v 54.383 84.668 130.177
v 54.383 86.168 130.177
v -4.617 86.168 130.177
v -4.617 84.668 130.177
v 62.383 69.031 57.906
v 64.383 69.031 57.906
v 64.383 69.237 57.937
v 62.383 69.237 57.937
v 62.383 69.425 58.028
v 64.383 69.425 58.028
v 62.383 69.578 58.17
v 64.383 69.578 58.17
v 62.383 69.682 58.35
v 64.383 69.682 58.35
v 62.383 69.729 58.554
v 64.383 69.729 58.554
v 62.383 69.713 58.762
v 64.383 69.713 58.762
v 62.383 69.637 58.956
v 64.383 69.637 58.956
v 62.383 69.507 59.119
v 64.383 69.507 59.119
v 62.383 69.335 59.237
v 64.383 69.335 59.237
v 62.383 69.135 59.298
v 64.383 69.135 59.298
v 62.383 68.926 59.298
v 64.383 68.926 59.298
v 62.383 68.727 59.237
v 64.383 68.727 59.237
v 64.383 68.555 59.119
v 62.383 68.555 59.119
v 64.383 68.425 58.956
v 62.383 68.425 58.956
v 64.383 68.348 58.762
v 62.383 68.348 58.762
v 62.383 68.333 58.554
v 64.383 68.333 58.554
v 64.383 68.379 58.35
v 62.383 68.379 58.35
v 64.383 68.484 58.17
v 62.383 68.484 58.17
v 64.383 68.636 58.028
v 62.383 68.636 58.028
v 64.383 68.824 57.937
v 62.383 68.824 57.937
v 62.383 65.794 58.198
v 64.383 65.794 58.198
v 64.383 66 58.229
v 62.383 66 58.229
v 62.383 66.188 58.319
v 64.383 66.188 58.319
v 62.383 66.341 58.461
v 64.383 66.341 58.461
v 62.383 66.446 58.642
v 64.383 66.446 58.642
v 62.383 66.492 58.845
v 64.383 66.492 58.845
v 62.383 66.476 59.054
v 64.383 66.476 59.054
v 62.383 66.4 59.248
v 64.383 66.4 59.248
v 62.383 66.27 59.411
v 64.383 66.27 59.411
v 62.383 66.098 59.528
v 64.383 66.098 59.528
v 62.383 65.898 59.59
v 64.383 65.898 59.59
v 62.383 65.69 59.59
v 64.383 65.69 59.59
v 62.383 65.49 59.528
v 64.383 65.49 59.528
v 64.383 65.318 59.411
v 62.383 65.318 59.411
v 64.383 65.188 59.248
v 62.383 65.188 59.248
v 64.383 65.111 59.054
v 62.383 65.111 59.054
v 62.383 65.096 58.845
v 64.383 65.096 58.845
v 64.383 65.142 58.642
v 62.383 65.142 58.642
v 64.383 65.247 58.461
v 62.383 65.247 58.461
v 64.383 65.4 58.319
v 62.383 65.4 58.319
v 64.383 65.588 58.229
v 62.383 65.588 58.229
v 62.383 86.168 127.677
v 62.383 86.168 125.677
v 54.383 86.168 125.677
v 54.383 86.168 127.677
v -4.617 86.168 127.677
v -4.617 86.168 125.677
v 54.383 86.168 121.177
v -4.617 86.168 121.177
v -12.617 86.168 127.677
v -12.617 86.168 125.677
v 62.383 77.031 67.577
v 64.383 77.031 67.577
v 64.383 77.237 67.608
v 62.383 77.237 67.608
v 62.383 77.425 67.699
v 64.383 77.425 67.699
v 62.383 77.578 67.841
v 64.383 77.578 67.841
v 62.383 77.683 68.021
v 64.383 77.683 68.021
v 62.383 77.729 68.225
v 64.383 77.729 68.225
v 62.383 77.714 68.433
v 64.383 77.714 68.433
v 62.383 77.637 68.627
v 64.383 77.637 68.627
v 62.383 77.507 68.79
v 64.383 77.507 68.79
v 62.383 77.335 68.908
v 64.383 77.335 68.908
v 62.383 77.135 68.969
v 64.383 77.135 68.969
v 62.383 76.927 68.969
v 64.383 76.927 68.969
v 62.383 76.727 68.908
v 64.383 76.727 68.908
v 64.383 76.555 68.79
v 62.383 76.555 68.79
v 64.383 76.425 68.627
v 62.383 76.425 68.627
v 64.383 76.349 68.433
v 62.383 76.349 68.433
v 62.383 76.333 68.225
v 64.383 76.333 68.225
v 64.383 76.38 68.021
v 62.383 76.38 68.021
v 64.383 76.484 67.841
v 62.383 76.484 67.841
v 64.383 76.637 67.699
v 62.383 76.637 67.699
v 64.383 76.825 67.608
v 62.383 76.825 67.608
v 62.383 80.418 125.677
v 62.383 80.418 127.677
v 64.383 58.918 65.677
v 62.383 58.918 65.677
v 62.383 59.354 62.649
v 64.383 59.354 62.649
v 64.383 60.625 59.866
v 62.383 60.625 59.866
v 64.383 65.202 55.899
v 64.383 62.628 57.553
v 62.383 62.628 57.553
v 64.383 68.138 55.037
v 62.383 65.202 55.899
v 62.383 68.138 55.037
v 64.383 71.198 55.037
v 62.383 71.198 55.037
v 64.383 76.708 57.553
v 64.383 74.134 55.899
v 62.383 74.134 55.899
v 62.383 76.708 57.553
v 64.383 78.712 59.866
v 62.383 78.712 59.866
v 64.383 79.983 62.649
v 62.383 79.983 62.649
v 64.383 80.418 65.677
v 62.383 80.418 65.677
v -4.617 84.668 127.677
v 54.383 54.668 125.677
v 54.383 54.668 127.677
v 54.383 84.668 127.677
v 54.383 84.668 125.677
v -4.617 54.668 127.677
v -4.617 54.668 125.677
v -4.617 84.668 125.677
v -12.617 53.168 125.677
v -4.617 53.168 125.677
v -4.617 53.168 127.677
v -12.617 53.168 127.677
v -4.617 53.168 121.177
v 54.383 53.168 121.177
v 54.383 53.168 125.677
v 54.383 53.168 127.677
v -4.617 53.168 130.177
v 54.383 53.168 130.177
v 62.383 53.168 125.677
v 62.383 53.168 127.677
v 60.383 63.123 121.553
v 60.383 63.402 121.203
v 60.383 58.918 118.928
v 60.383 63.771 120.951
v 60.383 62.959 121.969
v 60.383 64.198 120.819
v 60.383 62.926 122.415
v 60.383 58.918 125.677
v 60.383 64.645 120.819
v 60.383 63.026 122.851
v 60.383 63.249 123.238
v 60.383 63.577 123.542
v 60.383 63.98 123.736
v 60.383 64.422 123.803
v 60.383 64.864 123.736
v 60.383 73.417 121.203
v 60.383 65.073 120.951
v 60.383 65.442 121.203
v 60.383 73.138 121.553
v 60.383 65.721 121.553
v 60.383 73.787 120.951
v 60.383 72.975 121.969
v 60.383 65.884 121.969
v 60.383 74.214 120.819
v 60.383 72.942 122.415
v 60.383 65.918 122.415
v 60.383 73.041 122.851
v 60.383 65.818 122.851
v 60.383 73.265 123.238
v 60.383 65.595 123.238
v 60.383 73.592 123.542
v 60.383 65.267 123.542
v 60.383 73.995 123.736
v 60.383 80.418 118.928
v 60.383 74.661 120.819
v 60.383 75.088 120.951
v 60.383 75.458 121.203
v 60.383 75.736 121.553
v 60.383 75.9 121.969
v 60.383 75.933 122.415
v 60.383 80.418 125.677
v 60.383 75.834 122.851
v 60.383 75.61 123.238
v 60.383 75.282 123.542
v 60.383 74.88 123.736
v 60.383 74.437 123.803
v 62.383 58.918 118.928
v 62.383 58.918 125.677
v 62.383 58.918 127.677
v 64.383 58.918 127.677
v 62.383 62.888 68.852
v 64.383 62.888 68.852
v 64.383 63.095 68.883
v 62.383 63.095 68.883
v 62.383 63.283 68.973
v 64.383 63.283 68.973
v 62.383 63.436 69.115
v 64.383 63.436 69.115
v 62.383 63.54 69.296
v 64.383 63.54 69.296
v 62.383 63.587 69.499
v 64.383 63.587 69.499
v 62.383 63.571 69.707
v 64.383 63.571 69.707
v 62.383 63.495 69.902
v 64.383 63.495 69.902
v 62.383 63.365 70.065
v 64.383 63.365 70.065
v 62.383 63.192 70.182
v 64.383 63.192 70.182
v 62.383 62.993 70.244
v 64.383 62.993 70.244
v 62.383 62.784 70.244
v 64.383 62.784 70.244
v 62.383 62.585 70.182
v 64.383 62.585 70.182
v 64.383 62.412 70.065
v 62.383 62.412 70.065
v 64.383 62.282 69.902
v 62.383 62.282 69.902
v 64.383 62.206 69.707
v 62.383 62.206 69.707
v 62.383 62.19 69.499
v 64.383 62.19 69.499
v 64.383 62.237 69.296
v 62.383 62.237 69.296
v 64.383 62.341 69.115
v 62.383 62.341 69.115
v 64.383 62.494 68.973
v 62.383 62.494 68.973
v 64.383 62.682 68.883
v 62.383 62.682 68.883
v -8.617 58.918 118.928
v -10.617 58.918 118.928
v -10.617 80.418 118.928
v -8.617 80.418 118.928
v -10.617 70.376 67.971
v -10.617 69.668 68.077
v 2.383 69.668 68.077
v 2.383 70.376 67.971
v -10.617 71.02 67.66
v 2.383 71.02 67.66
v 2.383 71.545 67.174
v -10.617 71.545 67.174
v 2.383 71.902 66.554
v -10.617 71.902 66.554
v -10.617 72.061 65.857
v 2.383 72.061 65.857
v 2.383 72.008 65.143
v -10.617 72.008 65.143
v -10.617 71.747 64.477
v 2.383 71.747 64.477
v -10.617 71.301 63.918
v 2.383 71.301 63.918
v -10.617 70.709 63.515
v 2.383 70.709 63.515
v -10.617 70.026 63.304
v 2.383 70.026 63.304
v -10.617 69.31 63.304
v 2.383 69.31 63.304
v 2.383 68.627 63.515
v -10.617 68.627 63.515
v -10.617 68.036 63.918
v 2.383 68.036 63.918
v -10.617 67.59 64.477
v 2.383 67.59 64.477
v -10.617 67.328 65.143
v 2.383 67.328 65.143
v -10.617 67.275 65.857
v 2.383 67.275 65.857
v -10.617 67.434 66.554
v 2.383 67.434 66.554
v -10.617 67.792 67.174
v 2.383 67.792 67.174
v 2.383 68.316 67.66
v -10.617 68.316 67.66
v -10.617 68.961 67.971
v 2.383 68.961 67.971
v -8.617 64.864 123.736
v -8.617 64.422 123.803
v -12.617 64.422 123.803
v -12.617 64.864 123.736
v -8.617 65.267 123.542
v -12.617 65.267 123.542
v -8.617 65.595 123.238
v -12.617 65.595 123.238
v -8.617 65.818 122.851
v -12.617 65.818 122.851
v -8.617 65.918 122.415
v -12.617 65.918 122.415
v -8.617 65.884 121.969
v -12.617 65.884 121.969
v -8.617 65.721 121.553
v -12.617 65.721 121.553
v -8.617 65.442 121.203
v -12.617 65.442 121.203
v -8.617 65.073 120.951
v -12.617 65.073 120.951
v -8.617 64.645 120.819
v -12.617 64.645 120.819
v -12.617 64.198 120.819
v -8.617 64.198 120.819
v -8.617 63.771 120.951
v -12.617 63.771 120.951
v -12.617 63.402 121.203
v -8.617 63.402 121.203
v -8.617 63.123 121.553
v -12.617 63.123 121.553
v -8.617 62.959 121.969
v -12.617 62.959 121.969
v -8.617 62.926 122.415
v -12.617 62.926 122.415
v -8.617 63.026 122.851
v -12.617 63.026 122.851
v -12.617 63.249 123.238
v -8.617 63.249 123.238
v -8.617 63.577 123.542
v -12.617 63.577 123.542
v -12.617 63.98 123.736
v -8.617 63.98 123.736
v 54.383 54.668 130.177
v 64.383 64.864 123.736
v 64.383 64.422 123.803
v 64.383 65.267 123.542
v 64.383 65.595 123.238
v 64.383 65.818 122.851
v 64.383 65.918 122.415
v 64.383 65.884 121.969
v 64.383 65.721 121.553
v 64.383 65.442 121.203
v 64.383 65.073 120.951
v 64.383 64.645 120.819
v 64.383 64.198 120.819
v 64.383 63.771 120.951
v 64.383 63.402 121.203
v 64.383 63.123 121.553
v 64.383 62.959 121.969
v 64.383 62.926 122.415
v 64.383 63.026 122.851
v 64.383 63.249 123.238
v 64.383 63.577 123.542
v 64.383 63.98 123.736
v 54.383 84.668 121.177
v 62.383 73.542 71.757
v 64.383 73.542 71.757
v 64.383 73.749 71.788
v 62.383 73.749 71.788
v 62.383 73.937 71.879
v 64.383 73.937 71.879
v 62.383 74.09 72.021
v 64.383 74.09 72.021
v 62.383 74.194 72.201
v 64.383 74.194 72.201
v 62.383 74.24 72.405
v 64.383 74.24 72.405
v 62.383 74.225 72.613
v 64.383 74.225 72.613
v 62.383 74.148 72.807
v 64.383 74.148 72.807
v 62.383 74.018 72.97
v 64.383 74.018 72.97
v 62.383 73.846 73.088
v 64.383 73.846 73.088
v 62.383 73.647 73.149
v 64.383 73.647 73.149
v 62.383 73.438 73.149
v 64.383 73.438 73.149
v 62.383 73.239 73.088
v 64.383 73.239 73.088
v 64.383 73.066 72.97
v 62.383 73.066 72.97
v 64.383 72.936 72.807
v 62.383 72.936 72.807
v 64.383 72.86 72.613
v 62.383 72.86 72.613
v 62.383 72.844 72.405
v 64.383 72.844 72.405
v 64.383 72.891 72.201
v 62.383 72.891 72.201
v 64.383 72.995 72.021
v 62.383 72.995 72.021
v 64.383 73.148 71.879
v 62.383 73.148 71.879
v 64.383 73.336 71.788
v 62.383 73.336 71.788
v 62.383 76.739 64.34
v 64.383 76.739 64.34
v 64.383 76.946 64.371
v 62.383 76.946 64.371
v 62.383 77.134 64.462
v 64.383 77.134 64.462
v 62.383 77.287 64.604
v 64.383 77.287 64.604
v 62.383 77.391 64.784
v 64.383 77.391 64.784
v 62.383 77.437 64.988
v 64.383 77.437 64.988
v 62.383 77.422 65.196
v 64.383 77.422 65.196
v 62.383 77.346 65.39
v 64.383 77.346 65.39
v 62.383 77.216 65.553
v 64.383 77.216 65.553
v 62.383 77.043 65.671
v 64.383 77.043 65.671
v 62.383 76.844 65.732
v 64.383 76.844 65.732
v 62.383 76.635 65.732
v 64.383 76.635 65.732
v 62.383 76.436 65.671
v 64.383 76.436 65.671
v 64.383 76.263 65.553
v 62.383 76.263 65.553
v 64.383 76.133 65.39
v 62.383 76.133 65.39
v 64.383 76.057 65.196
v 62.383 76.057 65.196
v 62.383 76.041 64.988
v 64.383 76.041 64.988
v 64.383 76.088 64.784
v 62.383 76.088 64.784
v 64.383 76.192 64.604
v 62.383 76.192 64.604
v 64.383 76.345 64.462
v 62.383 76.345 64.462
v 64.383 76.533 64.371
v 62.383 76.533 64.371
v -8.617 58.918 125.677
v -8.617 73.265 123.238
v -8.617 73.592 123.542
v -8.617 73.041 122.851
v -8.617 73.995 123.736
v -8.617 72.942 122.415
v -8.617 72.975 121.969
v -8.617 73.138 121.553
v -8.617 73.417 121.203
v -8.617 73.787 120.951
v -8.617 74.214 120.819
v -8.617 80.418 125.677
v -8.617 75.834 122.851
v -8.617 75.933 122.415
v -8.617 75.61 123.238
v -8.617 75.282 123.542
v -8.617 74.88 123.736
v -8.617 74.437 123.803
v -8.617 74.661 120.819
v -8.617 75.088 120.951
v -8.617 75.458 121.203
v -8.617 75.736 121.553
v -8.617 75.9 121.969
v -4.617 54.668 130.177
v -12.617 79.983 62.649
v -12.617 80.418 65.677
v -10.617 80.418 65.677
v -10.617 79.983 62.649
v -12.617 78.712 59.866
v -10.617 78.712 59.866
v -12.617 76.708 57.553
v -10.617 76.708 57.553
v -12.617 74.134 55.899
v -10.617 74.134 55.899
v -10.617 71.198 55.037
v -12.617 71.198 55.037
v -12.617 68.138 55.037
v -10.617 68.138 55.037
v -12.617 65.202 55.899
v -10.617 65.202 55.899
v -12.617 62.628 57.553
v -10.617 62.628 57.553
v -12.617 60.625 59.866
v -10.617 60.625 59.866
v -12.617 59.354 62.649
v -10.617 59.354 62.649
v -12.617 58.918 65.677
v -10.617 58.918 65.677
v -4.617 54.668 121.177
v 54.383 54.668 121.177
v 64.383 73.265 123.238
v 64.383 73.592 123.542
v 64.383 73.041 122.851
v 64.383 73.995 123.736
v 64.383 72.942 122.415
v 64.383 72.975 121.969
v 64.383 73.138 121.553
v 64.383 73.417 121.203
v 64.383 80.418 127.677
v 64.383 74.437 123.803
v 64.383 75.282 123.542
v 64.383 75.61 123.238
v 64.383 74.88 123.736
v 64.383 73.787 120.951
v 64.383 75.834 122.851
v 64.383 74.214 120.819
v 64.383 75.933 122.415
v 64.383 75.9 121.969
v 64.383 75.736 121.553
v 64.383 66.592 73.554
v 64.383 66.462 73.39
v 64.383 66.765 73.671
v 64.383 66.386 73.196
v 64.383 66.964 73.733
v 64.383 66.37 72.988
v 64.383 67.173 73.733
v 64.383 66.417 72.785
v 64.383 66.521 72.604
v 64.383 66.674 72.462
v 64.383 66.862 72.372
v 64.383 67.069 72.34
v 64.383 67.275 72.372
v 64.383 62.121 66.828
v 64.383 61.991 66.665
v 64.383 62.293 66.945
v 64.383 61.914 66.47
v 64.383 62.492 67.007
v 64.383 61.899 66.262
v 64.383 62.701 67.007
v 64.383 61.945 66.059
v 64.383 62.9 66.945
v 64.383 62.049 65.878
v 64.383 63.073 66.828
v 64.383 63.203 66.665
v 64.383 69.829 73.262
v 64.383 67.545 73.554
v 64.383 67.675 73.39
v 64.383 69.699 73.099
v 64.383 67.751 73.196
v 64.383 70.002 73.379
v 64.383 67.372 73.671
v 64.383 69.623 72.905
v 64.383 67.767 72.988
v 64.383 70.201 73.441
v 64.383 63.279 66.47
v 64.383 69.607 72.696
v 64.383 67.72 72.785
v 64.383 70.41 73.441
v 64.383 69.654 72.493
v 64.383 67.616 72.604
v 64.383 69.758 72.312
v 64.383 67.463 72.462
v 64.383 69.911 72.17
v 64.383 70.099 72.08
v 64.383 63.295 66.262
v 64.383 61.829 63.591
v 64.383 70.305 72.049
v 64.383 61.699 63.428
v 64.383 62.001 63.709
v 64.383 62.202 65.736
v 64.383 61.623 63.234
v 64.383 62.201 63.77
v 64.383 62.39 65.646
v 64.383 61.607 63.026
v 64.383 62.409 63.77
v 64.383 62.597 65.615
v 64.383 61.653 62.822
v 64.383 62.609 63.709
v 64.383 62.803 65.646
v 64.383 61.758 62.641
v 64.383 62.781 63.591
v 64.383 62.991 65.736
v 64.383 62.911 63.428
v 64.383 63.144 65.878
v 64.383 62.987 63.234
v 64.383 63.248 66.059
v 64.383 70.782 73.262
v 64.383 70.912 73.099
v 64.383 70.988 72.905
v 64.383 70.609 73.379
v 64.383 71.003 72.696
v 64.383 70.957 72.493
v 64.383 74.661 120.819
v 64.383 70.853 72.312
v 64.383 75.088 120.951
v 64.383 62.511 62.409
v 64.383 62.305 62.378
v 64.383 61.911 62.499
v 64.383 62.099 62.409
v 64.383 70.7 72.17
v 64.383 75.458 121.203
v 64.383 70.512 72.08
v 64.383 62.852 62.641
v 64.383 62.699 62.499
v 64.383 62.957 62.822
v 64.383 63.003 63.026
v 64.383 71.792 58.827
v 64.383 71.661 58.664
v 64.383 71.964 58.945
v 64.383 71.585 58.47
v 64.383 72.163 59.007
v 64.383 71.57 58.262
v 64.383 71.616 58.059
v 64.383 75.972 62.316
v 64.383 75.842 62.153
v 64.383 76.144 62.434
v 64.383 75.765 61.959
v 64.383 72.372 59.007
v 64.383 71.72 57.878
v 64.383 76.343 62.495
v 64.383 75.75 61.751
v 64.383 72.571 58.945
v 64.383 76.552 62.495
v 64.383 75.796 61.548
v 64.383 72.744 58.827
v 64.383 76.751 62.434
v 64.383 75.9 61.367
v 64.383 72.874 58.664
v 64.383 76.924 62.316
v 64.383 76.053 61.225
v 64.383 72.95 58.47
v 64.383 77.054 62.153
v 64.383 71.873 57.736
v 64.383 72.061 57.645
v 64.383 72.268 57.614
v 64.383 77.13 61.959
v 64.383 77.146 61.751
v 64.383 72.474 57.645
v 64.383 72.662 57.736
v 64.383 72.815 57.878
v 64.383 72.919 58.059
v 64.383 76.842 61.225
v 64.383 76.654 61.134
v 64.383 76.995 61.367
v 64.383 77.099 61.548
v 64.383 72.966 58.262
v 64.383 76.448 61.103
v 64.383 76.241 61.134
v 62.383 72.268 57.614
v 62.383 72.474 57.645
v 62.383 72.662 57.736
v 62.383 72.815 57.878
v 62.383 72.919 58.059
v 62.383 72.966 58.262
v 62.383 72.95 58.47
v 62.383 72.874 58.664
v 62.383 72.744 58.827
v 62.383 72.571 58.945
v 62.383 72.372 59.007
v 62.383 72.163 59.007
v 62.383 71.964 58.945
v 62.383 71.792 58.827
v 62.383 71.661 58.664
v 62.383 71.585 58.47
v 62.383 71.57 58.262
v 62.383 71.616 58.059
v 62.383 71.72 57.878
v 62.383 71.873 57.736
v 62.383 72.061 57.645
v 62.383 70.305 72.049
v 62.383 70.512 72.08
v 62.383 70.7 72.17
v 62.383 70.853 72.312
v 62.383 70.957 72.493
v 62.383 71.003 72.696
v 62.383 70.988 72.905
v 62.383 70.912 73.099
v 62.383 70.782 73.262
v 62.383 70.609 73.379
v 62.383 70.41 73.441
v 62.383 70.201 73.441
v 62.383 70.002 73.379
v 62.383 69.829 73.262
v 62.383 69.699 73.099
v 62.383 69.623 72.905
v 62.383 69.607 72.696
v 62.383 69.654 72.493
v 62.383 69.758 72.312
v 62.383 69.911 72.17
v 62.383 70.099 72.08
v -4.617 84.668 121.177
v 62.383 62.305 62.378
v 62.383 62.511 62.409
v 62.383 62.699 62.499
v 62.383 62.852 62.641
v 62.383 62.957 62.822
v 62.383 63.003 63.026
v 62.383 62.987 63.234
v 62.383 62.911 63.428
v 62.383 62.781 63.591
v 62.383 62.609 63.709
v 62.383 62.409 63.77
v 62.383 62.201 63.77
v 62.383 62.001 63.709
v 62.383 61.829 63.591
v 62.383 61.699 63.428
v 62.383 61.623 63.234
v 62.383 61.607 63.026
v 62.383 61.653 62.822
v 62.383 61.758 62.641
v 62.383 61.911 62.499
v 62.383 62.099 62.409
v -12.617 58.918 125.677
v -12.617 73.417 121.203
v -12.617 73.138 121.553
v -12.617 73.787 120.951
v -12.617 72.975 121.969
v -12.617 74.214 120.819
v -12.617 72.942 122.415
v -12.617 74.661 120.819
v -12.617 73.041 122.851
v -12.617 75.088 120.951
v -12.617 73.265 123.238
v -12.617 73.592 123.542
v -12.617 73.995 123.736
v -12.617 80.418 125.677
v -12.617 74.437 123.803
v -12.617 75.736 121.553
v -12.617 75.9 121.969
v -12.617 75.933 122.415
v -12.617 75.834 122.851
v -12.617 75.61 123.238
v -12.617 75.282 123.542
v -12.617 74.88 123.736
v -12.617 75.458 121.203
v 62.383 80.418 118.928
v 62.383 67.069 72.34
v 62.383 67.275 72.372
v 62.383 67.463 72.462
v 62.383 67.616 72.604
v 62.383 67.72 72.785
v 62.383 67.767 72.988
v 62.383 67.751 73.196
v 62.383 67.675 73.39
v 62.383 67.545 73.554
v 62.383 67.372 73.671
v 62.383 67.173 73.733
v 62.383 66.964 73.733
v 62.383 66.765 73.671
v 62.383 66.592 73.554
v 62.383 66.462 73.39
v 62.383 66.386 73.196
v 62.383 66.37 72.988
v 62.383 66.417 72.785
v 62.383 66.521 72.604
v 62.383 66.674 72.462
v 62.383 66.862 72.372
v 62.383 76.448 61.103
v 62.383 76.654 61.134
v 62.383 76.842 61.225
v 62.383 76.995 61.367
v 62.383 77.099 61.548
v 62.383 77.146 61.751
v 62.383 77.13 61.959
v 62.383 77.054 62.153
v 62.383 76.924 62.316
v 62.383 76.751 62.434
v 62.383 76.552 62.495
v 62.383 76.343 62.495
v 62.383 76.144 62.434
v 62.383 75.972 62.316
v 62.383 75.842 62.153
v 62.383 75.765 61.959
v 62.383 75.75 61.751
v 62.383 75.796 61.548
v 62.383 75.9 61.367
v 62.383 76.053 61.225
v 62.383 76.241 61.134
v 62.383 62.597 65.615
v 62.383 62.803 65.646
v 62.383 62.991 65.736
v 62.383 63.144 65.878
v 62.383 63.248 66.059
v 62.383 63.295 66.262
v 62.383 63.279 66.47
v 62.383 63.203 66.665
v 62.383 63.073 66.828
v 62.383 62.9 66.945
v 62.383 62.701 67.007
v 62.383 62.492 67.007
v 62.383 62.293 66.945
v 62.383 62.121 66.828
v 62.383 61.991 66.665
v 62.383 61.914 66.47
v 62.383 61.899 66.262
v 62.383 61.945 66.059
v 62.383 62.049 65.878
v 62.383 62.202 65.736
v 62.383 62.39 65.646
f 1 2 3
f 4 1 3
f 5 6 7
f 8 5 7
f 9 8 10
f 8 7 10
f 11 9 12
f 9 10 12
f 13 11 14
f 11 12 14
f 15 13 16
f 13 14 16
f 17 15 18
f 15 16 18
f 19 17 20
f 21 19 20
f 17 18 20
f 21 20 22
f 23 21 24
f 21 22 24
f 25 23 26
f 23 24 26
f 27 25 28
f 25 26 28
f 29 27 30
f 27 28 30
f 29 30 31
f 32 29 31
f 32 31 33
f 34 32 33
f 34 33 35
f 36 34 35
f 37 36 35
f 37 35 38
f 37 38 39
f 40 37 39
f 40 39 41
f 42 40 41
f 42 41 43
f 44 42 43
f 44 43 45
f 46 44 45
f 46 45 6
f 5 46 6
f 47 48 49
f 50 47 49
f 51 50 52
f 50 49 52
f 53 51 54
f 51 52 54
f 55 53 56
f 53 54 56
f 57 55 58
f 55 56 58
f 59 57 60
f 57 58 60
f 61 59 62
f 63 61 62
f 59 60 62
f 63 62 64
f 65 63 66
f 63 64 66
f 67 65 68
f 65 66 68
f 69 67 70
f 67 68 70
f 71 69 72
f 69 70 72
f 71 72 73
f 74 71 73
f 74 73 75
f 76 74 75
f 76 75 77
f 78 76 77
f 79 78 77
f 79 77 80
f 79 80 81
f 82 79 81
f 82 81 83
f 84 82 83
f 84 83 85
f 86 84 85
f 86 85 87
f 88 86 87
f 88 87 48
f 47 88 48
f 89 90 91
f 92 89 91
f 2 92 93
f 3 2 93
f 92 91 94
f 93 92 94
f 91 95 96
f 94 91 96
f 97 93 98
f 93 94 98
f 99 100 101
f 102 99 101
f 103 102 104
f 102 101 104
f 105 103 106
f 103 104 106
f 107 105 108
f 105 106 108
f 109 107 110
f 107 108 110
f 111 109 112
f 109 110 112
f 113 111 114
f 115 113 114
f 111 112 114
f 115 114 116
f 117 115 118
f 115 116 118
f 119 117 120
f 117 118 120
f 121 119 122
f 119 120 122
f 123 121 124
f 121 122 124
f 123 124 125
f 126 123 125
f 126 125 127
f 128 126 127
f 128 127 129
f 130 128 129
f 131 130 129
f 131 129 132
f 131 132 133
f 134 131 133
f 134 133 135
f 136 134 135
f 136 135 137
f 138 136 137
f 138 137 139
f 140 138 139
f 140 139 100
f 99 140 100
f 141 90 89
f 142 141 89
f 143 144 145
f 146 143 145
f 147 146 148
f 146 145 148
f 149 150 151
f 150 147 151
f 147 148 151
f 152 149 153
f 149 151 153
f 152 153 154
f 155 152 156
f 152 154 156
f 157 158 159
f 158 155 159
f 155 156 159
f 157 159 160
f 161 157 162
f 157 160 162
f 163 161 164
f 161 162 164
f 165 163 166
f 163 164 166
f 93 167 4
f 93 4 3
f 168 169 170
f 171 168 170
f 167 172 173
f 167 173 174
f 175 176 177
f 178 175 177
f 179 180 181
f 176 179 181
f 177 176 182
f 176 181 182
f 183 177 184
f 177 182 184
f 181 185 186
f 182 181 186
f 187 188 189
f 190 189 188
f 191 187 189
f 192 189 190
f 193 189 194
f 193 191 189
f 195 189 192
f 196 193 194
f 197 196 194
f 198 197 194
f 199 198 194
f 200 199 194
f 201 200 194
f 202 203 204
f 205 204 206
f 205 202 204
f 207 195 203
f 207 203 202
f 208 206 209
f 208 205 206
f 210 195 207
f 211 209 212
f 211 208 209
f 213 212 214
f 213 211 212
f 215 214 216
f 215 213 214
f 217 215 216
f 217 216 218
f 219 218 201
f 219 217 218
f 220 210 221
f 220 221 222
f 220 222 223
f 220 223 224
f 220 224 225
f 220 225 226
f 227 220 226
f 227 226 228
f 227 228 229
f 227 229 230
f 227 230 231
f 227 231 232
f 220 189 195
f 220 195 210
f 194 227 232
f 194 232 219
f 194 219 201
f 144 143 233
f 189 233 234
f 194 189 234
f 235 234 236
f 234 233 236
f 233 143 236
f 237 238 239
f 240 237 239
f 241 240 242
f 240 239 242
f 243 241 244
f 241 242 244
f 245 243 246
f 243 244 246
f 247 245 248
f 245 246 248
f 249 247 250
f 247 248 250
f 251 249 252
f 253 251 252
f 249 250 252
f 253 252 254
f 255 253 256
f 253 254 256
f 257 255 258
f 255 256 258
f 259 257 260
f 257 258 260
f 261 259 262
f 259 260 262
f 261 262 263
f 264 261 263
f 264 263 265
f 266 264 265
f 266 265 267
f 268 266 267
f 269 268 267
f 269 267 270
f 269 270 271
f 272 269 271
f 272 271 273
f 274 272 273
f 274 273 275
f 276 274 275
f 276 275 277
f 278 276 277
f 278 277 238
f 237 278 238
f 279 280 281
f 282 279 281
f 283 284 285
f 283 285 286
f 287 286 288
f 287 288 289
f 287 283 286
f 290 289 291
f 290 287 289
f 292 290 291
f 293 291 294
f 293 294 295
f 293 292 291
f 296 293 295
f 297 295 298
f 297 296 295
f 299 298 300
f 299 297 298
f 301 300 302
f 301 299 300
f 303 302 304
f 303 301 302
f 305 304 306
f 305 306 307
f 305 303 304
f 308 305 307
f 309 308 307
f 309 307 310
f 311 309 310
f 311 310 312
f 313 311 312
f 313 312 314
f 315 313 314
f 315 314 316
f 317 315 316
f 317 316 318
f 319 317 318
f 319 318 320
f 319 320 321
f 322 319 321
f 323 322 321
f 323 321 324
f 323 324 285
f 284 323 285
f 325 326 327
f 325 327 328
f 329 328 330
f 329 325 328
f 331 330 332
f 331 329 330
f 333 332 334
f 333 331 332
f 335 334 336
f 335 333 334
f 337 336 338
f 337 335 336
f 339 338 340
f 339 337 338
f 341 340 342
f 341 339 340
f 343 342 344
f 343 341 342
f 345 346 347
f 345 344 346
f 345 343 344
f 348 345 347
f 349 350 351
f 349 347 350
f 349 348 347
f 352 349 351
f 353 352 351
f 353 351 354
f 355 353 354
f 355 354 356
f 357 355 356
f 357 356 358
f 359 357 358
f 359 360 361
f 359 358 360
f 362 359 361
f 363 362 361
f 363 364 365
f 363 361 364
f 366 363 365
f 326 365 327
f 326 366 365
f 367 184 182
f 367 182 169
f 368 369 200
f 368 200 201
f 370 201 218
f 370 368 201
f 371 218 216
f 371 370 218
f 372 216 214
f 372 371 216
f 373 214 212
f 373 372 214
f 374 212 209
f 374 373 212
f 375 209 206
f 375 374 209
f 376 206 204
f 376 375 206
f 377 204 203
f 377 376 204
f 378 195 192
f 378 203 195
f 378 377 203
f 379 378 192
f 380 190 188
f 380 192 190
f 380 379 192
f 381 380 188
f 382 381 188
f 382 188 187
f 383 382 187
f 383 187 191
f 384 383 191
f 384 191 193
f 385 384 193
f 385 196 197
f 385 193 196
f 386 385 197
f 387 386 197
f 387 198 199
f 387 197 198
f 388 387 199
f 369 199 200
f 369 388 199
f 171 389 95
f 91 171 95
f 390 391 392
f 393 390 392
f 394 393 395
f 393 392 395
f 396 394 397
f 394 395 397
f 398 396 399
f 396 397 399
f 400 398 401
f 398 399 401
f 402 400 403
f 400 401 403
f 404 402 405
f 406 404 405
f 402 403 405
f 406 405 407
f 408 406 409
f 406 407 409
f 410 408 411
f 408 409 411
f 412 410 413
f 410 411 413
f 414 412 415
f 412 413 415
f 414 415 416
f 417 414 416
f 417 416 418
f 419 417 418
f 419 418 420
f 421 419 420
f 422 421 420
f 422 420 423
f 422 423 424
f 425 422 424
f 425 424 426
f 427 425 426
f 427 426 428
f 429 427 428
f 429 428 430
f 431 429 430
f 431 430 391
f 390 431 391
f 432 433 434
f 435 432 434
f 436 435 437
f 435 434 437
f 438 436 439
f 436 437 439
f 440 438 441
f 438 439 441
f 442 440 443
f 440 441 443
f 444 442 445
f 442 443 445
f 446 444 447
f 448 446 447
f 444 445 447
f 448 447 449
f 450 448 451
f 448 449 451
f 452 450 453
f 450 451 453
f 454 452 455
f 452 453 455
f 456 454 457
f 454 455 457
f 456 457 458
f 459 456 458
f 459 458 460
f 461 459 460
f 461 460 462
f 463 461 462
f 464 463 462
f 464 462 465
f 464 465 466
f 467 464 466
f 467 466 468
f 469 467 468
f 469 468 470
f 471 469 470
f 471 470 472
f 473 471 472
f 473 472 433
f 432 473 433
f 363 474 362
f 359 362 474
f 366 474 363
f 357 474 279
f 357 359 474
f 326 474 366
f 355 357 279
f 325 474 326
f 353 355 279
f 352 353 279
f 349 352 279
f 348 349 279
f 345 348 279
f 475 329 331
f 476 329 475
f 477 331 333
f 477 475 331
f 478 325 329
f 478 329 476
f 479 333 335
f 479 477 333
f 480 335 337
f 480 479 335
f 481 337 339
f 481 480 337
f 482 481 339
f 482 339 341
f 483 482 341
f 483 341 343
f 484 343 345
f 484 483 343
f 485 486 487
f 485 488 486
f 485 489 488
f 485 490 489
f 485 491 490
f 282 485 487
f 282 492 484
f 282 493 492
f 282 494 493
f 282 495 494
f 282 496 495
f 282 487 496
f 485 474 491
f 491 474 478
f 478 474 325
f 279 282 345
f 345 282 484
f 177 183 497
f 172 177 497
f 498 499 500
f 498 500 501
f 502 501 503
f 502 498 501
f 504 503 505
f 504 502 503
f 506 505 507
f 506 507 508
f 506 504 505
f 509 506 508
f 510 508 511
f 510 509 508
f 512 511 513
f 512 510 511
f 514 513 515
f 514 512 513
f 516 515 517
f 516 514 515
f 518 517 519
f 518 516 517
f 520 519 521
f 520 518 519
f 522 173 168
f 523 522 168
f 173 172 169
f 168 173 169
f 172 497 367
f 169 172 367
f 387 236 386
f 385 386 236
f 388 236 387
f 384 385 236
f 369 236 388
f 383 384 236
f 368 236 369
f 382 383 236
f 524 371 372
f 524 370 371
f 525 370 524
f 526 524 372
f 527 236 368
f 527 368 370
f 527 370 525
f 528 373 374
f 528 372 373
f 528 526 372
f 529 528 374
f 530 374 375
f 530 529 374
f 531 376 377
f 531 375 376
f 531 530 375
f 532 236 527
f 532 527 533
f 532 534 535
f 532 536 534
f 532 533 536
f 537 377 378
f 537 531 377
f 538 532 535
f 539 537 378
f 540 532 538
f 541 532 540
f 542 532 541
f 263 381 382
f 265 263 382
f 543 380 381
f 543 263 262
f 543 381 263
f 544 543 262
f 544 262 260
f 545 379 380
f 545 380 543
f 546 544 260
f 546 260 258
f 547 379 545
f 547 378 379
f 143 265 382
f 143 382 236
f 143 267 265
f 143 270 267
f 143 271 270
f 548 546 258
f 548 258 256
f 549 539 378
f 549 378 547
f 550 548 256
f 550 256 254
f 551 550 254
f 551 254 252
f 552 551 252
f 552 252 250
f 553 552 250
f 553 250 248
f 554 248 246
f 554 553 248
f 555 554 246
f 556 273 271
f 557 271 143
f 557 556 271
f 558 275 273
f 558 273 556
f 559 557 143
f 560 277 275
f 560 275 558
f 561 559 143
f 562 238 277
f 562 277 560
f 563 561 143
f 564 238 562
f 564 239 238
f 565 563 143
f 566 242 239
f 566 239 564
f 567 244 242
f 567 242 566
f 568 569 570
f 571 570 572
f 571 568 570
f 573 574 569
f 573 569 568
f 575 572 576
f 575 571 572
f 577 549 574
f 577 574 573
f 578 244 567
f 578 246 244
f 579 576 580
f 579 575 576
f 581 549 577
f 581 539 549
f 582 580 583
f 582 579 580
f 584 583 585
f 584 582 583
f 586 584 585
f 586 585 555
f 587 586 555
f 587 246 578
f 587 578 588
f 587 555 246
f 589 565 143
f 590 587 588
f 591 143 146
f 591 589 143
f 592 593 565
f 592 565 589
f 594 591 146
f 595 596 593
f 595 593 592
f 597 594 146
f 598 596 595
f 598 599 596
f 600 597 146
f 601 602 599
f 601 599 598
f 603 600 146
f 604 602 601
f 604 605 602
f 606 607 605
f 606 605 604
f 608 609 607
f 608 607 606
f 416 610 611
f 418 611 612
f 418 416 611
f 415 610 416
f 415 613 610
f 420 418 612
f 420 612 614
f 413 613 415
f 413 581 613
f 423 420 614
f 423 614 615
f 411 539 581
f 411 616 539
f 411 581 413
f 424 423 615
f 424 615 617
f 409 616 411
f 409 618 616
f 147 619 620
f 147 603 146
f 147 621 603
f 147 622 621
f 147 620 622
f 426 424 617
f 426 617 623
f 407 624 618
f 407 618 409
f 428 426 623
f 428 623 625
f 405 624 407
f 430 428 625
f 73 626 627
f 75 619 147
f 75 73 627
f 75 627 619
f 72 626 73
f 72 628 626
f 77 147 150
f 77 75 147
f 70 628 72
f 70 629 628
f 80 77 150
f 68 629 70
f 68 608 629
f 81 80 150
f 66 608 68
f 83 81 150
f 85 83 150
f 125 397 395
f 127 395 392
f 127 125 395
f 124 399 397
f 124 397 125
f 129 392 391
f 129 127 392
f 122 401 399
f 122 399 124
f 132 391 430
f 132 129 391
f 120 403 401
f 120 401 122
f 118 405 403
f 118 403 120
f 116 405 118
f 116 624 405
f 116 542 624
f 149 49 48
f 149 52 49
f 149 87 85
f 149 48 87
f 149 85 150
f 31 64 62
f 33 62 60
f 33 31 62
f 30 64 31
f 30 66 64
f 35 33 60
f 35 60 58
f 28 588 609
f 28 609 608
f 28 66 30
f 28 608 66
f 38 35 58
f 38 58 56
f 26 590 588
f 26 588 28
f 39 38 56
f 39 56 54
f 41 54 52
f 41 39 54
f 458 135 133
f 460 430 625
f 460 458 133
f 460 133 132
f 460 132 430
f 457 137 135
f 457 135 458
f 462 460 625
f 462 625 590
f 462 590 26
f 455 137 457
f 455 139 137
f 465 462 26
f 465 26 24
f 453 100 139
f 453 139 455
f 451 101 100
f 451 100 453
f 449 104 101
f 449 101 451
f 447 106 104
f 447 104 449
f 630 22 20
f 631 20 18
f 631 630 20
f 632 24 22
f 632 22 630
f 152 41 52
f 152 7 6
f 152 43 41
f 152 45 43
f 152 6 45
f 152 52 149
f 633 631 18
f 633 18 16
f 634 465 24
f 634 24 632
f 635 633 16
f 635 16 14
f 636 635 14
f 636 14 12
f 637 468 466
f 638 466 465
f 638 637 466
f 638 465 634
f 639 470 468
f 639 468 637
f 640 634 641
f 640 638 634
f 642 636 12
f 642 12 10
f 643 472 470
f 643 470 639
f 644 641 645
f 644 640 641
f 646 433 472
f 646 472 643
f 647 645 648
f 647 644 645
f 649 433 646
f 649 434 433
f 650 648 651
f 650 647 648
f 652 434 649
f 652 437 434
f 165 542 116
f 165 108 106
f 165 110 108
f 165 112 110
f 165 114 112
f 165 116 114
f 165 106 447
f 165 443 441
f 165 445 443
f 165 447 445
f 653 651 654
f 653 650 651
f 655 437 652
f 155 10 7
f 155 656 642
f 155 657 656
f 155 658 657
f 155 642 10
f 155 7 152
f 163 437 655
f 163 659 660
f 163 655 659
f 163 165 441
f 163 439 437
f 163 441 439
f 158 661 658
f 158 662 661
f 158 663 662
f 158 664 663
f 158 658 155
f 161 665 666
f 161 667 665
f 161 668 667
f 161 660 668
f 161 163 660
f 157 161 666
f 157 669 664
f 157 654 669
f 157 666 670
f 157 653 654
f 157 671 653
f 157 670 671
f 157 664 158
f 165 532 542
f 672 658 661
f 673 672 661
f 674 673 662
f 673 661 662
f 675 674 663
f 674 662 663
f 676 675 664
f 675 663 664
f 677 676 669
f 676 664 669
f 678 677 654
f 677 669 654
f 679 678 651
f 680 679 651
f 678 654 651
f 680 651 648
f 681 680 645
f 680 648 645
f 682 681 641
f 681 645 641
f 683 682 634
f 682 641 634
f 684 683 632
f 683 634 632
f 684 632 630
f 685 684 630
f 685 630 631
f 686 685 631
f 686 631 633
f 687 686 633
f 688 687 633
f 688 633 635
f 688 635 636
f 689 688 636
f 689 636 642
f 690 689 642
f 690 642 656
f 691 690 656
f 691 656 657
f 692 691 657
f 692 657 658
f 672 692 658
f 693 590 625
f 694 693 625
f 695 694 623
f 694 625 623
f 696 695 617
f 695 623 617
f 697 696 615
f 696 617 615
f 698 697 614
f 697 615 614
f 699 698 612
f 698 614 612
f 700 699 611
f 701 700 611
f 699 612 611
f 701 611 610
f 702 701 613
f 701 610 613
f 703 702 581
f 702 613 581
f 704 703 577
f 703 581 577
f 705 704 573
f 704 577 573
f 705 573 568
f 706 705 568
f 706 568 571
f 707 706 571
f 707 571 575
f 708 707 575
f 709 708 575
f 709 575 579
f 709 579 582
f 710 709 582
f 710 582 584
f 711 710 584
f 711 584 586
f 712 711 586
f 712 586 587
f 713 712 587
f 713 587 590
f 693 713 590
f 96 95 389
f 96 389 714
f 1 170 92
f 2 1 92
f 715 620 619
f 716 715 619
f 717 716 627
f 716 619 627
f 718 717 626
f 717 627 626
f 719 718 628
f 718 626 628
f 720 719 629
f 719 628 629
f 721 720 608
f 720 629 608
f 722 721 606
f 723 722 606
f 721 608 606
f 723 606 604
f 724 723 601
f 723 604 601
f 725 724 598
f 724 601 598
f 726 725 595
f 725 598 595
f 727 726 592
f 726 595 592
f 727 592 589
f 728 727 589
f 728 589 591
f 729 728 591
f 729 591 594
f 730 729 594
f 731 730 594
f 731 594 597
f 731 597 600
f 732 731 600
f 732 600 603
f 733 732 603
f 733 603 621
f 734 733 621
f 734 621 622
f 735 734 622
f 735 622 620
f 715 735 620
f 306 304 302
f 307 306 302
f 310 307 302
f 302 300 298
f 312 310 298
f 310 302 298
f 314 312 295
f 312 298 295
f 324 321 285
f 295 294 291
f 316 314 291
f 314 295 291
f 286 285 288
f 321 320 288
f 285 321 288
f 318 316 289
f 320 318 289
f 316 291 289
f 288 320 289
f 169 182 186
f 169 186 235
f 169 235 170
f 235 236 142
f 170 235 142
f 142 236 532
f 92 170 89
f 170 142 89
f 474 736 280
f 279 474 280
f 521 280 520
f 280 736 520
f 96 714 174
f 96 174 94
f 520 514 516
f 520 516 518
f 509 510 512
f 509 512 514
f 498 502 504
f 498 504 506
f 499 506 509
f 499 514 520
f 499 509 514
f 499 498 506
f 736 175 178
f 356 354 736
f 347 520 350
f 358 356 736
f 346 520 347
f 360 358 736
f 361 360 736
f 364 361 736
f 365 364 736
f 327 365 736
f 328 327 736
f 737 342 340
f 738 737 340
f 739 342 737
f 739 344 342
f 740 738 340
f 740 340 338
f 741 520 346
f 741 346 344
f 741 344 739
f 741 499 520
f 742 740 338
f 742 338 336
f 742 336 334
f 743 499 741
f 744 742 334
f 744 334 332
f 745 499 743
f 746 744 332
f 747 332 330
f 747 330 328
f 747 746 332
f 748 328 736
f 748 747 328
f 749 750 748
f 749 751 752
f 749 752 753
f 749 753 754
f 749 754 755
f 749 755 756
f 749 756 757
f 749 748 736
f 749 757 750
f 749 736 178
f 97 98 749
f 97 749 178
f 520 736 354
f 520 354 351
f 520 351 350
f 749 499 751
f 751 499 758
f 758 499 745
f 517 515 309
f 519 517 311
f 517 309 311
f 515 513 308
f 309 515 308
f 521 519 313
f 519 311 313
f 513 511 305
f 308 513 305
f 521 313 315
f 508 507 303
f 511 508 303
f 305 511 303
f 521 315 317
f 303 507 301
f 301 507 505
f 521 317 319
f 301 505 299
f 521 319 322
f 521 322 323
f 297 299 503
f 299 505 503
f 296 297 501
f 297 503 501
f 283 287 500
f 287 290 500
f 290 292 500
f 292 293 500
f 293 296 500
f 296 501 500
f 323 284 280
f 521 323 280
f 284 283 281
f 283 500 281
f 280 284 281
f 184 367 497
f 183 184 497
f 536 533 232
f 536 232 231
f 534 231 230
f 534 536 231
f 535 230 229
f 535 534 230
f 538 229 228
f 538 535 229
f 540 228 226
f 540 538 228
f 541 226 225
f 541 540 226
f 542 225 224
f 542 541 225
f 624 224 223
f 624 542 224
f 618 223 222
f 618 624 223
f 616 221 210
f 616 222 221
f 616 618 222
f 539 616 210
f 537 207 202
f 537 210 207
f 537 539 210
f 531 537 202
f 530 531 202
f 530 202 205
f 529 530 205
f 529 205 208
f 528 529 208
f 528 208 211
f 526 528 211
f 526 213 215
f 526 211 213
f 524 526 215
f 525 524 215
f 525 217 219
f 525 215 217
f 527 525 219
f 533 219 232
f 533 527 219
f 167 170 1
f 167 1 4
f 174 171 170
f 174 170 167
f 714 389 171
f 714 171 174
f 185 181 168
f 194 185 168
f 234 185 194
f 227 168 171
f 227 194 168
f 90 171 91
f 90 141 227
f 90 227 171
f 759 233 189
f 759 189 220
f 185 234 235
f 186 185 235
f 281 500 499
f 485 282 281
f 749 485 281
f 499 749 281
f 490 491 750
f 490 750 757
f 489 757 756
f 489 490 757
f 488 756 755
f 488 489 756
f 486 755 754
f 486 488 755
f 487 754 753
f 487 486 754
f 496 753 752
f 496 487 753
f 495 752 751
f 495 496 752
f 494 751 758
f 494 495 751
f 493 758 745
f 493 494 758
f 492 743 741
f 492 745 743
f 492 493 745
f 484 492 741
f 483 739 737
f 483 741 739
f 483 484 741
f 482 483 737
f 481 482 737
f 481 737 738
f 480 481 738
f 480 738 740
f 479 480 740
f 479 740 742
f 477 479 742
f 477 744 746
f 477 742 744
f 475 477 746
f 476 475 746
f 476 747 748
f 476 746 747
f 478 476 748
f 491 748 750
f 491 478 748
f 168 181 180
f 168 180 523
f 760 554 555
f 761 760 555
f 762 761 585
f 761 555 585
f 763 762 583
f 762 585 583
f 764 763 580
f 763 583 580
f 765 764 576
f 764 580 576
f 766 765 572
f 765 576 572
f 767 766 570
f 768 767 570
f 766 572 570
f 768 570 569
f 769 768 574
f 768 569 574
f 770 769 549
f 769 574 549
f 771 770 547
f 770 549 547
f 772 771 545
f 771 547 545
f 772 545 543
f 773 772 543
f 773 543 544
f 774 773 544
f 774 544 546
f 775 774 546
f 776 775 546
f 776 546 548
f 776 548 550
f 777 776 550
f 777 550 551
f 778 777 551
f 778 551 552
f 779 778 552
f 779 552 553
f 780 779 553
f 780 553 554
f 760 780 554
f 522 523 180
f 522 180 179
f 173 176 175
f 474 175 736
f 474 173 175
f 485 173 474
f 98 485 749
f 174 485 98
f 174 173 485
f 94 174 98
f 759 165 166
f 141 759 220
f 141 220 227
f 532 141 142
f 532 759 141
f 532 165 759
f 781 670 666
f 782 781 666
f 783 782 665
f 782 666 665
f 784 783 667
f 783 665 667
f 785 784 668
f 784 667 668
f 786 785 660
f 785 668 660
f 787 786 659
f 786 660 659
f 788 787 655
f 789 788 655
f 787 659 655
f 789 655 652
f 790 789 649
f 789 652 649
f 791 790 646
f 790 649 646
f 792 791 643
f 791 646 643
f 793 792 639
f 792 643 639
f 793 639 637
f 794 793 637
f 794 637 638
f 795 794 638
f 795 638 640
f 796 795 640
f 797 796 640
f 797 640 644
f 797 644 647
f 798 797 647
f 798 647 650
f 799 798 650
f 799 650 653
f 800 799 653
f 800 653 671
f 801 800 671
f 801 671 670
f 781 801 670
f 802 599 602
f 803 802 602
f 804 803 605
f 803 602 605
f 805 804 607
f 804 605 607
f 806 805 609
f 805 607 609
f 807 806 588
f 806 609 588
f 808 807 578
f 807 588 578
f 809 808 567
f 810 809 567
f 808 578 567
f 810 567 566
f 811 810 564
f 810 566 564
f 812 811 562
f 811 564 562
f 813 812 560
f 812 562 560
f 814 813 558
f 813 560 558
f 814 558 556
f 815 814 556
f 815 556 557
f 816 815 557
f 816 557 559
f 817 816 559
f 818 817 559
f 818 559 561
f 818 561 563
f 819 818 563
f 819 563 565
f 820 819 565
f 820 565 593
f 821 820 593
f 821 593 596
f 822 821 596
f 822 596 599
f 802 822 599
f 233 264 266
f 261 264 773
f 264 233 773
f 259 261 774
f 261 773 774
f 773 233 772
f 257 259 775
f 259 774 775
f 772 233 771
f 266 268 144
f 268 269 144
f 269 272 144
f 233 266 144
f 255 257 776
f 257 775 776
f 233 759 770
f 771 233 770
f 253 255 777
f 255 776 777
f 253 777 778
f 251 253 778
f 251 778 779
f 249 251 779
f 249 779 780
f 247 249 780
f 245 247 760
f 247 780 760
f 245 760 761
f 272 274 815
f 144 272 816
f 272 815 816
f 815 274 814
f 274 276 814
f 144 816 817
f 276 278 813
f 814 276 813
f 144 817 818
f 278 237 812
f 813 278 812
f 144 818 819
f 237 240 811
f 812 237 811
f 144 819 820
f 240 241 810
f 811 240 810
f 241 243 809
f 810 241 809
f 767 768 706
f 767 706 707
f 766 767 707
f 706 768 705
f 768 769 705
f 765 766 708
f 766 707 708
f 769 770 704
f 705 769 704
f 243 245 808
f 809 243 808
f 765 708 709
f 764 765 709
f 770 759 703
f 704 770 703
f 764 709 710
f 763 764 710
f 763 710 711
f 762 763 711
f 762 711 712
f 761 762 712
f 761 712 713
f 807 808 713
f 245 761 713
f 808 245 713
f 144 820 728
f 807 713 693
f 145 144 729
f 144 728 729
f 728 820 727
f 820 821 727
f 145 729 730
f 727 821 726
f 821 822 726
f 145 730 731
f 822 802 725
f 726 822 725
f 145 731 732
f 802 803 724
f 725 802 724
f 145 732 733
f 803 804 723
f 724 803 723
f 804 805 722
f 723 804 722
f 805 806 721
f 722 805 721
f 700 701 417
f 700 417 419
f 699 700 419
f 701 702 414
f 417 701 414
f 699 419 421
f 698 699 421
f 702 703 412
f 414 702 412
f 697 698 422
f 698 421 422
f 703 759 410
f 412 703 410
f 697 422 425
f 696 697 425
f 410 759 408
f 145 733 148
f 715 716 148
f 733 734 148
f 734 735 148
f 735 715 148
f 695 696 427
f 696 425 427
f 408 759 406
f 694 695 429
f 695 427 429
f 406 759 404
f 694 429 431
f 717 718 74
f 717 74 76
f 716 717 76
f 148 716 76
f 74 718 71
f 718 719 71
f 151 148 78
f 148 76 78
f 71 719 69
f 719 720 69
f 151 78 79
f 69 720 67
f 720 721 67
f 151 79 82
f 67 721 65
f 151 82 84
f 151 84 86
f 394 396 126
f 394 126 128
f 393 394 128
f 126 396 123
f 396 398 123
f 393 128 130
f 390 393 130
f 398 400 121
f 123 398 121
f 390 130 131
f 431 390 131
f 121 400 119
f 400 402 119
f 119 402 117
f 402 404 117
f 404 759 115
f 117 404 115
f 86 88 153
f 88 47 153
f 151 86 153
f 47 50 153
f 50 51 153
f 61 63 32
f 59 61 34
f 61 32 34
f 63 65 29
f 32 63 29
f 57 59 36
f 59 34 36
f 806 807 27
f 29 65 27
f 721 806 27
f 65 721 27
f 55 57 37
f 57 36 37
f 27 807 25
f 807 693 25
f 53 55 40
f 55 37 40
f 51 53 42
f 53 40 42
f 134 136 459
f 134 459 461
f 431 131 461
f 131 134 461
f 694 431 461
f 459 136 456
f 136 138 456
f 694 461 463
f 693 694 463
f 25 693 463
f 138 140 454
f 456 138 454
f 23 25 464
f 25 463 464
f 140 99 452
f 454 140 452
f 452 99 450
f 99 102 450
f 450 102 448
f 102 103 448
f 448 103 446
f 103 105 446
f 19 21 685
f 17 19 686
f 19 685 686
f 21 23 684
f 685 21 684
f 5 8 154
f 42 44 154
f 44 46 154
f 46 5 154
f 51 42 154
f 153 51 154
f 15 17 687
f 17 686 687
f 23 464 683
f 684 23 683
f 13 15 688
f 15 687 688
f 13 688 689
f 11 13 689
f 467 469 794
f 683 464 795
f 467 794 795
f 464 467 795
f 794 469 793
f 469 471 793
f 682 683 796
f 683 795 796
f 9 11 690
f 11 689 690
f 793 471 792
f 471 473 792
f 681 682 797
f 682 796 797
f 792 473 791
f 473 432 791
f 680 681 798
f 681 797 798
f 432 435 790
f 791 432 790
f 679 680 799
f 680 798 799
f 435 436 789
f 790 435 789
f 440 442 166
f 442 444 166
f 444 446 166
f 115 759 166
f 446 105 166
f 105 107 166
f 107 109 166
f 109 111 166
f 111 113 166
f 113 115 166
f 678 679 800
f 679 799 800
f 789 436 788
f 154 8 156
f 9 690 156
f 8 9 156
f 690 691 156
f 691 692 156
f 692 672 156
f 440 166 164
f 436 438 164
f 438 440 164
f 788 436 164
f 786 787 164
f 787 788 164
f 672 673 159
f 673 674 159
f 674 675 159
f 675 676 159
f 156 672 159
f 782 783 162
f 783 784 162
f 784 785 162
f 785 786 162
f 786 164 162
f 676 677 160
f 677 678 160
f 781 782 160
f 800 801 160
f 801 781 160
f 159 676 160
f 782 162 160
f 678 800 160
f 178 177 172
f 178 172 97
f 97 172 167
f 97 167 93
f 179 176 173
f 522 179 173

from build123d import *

# Parameters (mm, degrees)
SKETCH_2_R               = 10.75
SKETCH_2_R_2             = 0.5
EXTRUDE_1_DEPTH          = 2
EXTRUDE_3_DEPTH          = 2
SKETCH_4_W               = 2
SKETCH_4_H               = 33
EXTRUDE_4_DEPTH          = 75
SKETCH_8_R               = 0.7
CUT_EXTRUDE_1_DEPTH      = 7
SKETCH_9_W               = 2
SKETCH_9_H               = 21.5
EXTRUDE_7_DEPTH          = 60
EXTRUDE_2_DEPTH          = 2
SKETCH_11_R              = 2.4
EXTRUDE_8_DEPTH          = 15
SKETCH_12_W              = 59
SKETCH_12_H              = 30
CUT_EXTRUDE_2_DEPTH      = 15
SKETCH_13_W              = 59
SKETCH_13_H              = 1.5
EXTRUDE_9_DEPTH          = 4.5
SKETCH_15_W              = 6.749564512
SKETCH_15_H              = 21.5
EXTRUDE_10_DEPTH         = 2
SKETCH_16_W              = 6.749564512
SKETCH_16_H              = 21.5
EXTRUDE_11_DEPTH         = 2
CUT_EXTRUDE_3_DEPTH      = 173.33717765
CUT_EXTRUDE_3_DEPTH_BACK = 173.33717765
SKETCH_17_R              = 1.5


with BuildPart() as part:
    # 스케치2 → 보스-돌출1 (new body)
    with BuildSketch(Plane(origin=(62.38287134, 0, 0), x_dir=(0, 0, -1), z_dir=(1, 0, 0))):
        with Locations((-65.677419436, 69.66810471)):
            Circle(SKETCH_2_R)
        with Locations((-61.803243354, 76.447725619)):
            Circle(SKETCH_2_R_2, mode=Mode.SUBTRACT)
        with Locations((-65.040124528, 76.73944512)):
            Circle(SKETCH_2_R_2, mode=Mode.SUBTRACT)
        with Locations((-68.277005701, 77.03116462)):
            Circle(SKETCH_2_R_2, mode=Mode.SUBTRACT)
        with Locations((-72.457040346, 73.542280792)):
            Circle(SKETCH_2_R_2, mode=Mode.SUBTRACT)
        with Locations((-72.748759847, 70.305399618)):
            Circle(SKETCH_2_R_2, mode=Mode.SUBTRACT)
        with Locations((-73.040479347, 67.068518444)):
            Circle(SKETCH_2_R_2, mode=Mode.SUBTRACT)
        with Locations((-69.551595519, 62.8884838)):
            Circle(SKETCH_2_R_2, mode=Mode.SUBTRACT)
        with Locations((-66.314714345, 62.596764299)):
            Circle(SKETCH_2_R_2, mode=Mode.SUBTRACT)
        with Locations((-63.077833171, 62.305044799)):
            Circle(SKETCH_2_R_2, mode=Mode.SUBTRACT)
        with Locations((-58.897798526, 65.793928627)):
            Circle(SKETCH_2_R_2, mode=Mode.SUBTRACT)
        with Locations((-58.606079026, 69.030809801)):
            Circle(SKETCH_2_R_2, mode=Mode.SUBTRACT)
        with Locations((-58.314359525, 72.267690975)):
            Circle(SKETCH_2_R_2, mode=Mode.SUBTRACT)
    extrude(amount=EXTRUDE_1_DEPTH)

    # 스케치3 → 보스-돌출3 (add)
    with BuildSketch(Plane.ZY.offset(-62.38287134)):
        with BuildLine():
            Line((65.677419436, 80.41810471), (127.677419436, 80.41810471))
            Line((127.677419436, 80.41810471), (127.677419436, 58.91810471))
            Line((127.677419436, 58.91810471), (65.677419436, 58.91810471))
            ThreePointArc((65.677419436, 58.91810471), (76.427419436, 69.66810471), (65.677419436, 80.41810471))
        make_face()
    extrude(amount=-EXTRUDE_3_DEPTH)

    # 스케치4 → 보스-돌출4 (add)
    with BuildSketch(Plane.ZY.offset(-62.38287134)):
        with Locations((126.677419436, 69.66810471)):
            Rectangle(SKETCH_4_W, SKETCH_4_H)
    extrude(amount=EXTRUDE_4_DEPTH)

    # 스케치8 → 컷-돌출1 (cut)
    with BuildSketch(Plane(origin=(64.38287134, 0, 0), x_dir=(0, 0, -1), z_dir=(1, 0, 0))):
        with Locations((-68.277005701, 77.03116462)):
            Circle(SKETCH_8_R)
        with Locations((-65.040124528, 76.73944512)):
            Circle(SKETCH_8_R)
        with Locations((-61.803243354, 76.447725619)):
            Circle(SKETCH_8_R)
        with Locations((-58.314359525, 72.267690975)):
            Circle(SKETCH_8_R)
        with Locations((-58.606079026, 69.030809801)):
            Circle(SKETCH_8_R)
        with Locations((-58.897798526, 65.793928627)):
            Circle(SKETCH_8_R)
        with Locations((-63.077833171, 62.305044799)):
            Circle(SKETCH_8_R)
        with Locations((-66.314714345, 62.596764299)):
            Circle(SKETCH_8_R)
        with Locations((-69.551595519, 62.8884838)):
            Circle(SKETCH_8_R)
        with Locations((-73.040479347, 67.068518444)):
            Circle(SKETCH_8_R)
        with Locations((-72.748759847, 70.305399618)):
            Circle(SKETCH_8_R)
        with Locations((-72.457040346, 73.542280792)):
            Circle(SKETCH_8_R)
    extrude(amount=-CUT_EXTRUDE_1_DEPTH, mode=Mode.SUBTRACT)

    # 스케치9 → 보스-돌출7 (add)
    with BuildSketch(Plane(origin=(0, 0, 125.677419436), x_dir=(-1, 0, 0), z_dir=(0, 0, -1))):
        with Locations((11.61712866, 69.66810471)):
            Rectangle(SKETCH_9_W, SKETCH_9_H)
    extrude(amount=EXTRUDE_7_DEPTH)

    # 스케치10 → 돌출-얇게2 (add)
    with BuildSketch(Plane.ZY.offset(12.61712866)):
        with BuildLine():
            ThreePointArc((65.677419436, 80.41810471), (54.927419436, 69.66810471), (65.677419436, 58.91810471))
            Line((65.677419436, 58.91810471), (65.677419436, 68.91810471))
            ThreePointArc((65.677419436, 68.91810471), (64.927419436, 69.66810471), (65.677419436, 70.41810471))
            Line((65.677419436, 70.41810471), (65.677419436, 80.41810471))
        make_face()
    extrude(amount=-EXTRUDE_2_DEPTH)

    # 스케치11 → 보스-돌출8 (add)
    with BuildSketch(Plane.ZY.offset(12.61712866)):
        with Locations((65.677419436, 69.66810471)):
            Circle(SKETCH_11_R)
    extrude(amount=-EXTRUDE_8_DEPTH)

    # 스케치12 → 컷-돌출2 (cut)
    with BuildSketch(Plane.XY.offset(127.677419436)):
        with Locations((24.88287134, 69.66810471)):
            Rectangle(SKETCH_12_W, SKETCH_12_H)
    extrude(amount=-CUT_EXTRUDE_2_DEPTH, mode=Mode.SUBTRACT)

    # 스케치13 → 보스-돌출9 (add, symmetric)
    with BuildSketch(Plane(origin=(0, 0, 125.677419436), x_dir=(-1, 0, 0), z_dir=(0, 0, -1))):
        with Locations((-24.88287134, 53.91810471)):
            Rectangle(SKETCH_13_W, SKETCH_13_H)
        with Locations((-24.88287134, 85.41810471)):
            Rectangle(SKETCH_13_W, SKETCH_13_H)
    extrude(amount=EXTRUDE_9_DEPTH, both=True)

    # 스케치15 → 보스-돌출10 (add)
    with BuildSketch(Plane.ZY.offset(-62.38287134)):
        with Locations((122.30263718, 69.66810471)):
            Rectangle(SKETCH_15_W, SKETCH_15_H)
    extrude(amount=EXTRUDE_10_DEPTH)

    # 스케치16 → 보스-돌출11 (add)
    with BuildSketch(Plane(origin=(-10.61712866, 0, 0), x_dir=(0, 0, -1), z_dir=(1, 0, 0))):
        with Locations((-122.30263718, 69.66810471)):
            Rectangle(SKETCH_16_W, SKETCH_16_H)
    extrude(amount=EXTRUDE_11_DEPTH)

    # 스케치17 → 컷-돌출3 (cut, two sides: drawn at the far end of the back side and taken through both)
    with BuildSketch(Plane.ZY.offset(-60.38287134).offset(-CUT_EXTRUDE_3_DEPTH_BACK)):
        with Locations((122.30263718, 74.43740033)):
            Circle(SKETCH_17_R)
        with Locations((122.30263718, 64.421879527)):
            Circle(SKETCH_17_R)
    extrude(amount=CUT_EXTRUDE_3_DEPTH + CUT_EXTRUDE_3_DEPTH_BACK, mode=Mode.SUBTRACT)


solid = part.part
